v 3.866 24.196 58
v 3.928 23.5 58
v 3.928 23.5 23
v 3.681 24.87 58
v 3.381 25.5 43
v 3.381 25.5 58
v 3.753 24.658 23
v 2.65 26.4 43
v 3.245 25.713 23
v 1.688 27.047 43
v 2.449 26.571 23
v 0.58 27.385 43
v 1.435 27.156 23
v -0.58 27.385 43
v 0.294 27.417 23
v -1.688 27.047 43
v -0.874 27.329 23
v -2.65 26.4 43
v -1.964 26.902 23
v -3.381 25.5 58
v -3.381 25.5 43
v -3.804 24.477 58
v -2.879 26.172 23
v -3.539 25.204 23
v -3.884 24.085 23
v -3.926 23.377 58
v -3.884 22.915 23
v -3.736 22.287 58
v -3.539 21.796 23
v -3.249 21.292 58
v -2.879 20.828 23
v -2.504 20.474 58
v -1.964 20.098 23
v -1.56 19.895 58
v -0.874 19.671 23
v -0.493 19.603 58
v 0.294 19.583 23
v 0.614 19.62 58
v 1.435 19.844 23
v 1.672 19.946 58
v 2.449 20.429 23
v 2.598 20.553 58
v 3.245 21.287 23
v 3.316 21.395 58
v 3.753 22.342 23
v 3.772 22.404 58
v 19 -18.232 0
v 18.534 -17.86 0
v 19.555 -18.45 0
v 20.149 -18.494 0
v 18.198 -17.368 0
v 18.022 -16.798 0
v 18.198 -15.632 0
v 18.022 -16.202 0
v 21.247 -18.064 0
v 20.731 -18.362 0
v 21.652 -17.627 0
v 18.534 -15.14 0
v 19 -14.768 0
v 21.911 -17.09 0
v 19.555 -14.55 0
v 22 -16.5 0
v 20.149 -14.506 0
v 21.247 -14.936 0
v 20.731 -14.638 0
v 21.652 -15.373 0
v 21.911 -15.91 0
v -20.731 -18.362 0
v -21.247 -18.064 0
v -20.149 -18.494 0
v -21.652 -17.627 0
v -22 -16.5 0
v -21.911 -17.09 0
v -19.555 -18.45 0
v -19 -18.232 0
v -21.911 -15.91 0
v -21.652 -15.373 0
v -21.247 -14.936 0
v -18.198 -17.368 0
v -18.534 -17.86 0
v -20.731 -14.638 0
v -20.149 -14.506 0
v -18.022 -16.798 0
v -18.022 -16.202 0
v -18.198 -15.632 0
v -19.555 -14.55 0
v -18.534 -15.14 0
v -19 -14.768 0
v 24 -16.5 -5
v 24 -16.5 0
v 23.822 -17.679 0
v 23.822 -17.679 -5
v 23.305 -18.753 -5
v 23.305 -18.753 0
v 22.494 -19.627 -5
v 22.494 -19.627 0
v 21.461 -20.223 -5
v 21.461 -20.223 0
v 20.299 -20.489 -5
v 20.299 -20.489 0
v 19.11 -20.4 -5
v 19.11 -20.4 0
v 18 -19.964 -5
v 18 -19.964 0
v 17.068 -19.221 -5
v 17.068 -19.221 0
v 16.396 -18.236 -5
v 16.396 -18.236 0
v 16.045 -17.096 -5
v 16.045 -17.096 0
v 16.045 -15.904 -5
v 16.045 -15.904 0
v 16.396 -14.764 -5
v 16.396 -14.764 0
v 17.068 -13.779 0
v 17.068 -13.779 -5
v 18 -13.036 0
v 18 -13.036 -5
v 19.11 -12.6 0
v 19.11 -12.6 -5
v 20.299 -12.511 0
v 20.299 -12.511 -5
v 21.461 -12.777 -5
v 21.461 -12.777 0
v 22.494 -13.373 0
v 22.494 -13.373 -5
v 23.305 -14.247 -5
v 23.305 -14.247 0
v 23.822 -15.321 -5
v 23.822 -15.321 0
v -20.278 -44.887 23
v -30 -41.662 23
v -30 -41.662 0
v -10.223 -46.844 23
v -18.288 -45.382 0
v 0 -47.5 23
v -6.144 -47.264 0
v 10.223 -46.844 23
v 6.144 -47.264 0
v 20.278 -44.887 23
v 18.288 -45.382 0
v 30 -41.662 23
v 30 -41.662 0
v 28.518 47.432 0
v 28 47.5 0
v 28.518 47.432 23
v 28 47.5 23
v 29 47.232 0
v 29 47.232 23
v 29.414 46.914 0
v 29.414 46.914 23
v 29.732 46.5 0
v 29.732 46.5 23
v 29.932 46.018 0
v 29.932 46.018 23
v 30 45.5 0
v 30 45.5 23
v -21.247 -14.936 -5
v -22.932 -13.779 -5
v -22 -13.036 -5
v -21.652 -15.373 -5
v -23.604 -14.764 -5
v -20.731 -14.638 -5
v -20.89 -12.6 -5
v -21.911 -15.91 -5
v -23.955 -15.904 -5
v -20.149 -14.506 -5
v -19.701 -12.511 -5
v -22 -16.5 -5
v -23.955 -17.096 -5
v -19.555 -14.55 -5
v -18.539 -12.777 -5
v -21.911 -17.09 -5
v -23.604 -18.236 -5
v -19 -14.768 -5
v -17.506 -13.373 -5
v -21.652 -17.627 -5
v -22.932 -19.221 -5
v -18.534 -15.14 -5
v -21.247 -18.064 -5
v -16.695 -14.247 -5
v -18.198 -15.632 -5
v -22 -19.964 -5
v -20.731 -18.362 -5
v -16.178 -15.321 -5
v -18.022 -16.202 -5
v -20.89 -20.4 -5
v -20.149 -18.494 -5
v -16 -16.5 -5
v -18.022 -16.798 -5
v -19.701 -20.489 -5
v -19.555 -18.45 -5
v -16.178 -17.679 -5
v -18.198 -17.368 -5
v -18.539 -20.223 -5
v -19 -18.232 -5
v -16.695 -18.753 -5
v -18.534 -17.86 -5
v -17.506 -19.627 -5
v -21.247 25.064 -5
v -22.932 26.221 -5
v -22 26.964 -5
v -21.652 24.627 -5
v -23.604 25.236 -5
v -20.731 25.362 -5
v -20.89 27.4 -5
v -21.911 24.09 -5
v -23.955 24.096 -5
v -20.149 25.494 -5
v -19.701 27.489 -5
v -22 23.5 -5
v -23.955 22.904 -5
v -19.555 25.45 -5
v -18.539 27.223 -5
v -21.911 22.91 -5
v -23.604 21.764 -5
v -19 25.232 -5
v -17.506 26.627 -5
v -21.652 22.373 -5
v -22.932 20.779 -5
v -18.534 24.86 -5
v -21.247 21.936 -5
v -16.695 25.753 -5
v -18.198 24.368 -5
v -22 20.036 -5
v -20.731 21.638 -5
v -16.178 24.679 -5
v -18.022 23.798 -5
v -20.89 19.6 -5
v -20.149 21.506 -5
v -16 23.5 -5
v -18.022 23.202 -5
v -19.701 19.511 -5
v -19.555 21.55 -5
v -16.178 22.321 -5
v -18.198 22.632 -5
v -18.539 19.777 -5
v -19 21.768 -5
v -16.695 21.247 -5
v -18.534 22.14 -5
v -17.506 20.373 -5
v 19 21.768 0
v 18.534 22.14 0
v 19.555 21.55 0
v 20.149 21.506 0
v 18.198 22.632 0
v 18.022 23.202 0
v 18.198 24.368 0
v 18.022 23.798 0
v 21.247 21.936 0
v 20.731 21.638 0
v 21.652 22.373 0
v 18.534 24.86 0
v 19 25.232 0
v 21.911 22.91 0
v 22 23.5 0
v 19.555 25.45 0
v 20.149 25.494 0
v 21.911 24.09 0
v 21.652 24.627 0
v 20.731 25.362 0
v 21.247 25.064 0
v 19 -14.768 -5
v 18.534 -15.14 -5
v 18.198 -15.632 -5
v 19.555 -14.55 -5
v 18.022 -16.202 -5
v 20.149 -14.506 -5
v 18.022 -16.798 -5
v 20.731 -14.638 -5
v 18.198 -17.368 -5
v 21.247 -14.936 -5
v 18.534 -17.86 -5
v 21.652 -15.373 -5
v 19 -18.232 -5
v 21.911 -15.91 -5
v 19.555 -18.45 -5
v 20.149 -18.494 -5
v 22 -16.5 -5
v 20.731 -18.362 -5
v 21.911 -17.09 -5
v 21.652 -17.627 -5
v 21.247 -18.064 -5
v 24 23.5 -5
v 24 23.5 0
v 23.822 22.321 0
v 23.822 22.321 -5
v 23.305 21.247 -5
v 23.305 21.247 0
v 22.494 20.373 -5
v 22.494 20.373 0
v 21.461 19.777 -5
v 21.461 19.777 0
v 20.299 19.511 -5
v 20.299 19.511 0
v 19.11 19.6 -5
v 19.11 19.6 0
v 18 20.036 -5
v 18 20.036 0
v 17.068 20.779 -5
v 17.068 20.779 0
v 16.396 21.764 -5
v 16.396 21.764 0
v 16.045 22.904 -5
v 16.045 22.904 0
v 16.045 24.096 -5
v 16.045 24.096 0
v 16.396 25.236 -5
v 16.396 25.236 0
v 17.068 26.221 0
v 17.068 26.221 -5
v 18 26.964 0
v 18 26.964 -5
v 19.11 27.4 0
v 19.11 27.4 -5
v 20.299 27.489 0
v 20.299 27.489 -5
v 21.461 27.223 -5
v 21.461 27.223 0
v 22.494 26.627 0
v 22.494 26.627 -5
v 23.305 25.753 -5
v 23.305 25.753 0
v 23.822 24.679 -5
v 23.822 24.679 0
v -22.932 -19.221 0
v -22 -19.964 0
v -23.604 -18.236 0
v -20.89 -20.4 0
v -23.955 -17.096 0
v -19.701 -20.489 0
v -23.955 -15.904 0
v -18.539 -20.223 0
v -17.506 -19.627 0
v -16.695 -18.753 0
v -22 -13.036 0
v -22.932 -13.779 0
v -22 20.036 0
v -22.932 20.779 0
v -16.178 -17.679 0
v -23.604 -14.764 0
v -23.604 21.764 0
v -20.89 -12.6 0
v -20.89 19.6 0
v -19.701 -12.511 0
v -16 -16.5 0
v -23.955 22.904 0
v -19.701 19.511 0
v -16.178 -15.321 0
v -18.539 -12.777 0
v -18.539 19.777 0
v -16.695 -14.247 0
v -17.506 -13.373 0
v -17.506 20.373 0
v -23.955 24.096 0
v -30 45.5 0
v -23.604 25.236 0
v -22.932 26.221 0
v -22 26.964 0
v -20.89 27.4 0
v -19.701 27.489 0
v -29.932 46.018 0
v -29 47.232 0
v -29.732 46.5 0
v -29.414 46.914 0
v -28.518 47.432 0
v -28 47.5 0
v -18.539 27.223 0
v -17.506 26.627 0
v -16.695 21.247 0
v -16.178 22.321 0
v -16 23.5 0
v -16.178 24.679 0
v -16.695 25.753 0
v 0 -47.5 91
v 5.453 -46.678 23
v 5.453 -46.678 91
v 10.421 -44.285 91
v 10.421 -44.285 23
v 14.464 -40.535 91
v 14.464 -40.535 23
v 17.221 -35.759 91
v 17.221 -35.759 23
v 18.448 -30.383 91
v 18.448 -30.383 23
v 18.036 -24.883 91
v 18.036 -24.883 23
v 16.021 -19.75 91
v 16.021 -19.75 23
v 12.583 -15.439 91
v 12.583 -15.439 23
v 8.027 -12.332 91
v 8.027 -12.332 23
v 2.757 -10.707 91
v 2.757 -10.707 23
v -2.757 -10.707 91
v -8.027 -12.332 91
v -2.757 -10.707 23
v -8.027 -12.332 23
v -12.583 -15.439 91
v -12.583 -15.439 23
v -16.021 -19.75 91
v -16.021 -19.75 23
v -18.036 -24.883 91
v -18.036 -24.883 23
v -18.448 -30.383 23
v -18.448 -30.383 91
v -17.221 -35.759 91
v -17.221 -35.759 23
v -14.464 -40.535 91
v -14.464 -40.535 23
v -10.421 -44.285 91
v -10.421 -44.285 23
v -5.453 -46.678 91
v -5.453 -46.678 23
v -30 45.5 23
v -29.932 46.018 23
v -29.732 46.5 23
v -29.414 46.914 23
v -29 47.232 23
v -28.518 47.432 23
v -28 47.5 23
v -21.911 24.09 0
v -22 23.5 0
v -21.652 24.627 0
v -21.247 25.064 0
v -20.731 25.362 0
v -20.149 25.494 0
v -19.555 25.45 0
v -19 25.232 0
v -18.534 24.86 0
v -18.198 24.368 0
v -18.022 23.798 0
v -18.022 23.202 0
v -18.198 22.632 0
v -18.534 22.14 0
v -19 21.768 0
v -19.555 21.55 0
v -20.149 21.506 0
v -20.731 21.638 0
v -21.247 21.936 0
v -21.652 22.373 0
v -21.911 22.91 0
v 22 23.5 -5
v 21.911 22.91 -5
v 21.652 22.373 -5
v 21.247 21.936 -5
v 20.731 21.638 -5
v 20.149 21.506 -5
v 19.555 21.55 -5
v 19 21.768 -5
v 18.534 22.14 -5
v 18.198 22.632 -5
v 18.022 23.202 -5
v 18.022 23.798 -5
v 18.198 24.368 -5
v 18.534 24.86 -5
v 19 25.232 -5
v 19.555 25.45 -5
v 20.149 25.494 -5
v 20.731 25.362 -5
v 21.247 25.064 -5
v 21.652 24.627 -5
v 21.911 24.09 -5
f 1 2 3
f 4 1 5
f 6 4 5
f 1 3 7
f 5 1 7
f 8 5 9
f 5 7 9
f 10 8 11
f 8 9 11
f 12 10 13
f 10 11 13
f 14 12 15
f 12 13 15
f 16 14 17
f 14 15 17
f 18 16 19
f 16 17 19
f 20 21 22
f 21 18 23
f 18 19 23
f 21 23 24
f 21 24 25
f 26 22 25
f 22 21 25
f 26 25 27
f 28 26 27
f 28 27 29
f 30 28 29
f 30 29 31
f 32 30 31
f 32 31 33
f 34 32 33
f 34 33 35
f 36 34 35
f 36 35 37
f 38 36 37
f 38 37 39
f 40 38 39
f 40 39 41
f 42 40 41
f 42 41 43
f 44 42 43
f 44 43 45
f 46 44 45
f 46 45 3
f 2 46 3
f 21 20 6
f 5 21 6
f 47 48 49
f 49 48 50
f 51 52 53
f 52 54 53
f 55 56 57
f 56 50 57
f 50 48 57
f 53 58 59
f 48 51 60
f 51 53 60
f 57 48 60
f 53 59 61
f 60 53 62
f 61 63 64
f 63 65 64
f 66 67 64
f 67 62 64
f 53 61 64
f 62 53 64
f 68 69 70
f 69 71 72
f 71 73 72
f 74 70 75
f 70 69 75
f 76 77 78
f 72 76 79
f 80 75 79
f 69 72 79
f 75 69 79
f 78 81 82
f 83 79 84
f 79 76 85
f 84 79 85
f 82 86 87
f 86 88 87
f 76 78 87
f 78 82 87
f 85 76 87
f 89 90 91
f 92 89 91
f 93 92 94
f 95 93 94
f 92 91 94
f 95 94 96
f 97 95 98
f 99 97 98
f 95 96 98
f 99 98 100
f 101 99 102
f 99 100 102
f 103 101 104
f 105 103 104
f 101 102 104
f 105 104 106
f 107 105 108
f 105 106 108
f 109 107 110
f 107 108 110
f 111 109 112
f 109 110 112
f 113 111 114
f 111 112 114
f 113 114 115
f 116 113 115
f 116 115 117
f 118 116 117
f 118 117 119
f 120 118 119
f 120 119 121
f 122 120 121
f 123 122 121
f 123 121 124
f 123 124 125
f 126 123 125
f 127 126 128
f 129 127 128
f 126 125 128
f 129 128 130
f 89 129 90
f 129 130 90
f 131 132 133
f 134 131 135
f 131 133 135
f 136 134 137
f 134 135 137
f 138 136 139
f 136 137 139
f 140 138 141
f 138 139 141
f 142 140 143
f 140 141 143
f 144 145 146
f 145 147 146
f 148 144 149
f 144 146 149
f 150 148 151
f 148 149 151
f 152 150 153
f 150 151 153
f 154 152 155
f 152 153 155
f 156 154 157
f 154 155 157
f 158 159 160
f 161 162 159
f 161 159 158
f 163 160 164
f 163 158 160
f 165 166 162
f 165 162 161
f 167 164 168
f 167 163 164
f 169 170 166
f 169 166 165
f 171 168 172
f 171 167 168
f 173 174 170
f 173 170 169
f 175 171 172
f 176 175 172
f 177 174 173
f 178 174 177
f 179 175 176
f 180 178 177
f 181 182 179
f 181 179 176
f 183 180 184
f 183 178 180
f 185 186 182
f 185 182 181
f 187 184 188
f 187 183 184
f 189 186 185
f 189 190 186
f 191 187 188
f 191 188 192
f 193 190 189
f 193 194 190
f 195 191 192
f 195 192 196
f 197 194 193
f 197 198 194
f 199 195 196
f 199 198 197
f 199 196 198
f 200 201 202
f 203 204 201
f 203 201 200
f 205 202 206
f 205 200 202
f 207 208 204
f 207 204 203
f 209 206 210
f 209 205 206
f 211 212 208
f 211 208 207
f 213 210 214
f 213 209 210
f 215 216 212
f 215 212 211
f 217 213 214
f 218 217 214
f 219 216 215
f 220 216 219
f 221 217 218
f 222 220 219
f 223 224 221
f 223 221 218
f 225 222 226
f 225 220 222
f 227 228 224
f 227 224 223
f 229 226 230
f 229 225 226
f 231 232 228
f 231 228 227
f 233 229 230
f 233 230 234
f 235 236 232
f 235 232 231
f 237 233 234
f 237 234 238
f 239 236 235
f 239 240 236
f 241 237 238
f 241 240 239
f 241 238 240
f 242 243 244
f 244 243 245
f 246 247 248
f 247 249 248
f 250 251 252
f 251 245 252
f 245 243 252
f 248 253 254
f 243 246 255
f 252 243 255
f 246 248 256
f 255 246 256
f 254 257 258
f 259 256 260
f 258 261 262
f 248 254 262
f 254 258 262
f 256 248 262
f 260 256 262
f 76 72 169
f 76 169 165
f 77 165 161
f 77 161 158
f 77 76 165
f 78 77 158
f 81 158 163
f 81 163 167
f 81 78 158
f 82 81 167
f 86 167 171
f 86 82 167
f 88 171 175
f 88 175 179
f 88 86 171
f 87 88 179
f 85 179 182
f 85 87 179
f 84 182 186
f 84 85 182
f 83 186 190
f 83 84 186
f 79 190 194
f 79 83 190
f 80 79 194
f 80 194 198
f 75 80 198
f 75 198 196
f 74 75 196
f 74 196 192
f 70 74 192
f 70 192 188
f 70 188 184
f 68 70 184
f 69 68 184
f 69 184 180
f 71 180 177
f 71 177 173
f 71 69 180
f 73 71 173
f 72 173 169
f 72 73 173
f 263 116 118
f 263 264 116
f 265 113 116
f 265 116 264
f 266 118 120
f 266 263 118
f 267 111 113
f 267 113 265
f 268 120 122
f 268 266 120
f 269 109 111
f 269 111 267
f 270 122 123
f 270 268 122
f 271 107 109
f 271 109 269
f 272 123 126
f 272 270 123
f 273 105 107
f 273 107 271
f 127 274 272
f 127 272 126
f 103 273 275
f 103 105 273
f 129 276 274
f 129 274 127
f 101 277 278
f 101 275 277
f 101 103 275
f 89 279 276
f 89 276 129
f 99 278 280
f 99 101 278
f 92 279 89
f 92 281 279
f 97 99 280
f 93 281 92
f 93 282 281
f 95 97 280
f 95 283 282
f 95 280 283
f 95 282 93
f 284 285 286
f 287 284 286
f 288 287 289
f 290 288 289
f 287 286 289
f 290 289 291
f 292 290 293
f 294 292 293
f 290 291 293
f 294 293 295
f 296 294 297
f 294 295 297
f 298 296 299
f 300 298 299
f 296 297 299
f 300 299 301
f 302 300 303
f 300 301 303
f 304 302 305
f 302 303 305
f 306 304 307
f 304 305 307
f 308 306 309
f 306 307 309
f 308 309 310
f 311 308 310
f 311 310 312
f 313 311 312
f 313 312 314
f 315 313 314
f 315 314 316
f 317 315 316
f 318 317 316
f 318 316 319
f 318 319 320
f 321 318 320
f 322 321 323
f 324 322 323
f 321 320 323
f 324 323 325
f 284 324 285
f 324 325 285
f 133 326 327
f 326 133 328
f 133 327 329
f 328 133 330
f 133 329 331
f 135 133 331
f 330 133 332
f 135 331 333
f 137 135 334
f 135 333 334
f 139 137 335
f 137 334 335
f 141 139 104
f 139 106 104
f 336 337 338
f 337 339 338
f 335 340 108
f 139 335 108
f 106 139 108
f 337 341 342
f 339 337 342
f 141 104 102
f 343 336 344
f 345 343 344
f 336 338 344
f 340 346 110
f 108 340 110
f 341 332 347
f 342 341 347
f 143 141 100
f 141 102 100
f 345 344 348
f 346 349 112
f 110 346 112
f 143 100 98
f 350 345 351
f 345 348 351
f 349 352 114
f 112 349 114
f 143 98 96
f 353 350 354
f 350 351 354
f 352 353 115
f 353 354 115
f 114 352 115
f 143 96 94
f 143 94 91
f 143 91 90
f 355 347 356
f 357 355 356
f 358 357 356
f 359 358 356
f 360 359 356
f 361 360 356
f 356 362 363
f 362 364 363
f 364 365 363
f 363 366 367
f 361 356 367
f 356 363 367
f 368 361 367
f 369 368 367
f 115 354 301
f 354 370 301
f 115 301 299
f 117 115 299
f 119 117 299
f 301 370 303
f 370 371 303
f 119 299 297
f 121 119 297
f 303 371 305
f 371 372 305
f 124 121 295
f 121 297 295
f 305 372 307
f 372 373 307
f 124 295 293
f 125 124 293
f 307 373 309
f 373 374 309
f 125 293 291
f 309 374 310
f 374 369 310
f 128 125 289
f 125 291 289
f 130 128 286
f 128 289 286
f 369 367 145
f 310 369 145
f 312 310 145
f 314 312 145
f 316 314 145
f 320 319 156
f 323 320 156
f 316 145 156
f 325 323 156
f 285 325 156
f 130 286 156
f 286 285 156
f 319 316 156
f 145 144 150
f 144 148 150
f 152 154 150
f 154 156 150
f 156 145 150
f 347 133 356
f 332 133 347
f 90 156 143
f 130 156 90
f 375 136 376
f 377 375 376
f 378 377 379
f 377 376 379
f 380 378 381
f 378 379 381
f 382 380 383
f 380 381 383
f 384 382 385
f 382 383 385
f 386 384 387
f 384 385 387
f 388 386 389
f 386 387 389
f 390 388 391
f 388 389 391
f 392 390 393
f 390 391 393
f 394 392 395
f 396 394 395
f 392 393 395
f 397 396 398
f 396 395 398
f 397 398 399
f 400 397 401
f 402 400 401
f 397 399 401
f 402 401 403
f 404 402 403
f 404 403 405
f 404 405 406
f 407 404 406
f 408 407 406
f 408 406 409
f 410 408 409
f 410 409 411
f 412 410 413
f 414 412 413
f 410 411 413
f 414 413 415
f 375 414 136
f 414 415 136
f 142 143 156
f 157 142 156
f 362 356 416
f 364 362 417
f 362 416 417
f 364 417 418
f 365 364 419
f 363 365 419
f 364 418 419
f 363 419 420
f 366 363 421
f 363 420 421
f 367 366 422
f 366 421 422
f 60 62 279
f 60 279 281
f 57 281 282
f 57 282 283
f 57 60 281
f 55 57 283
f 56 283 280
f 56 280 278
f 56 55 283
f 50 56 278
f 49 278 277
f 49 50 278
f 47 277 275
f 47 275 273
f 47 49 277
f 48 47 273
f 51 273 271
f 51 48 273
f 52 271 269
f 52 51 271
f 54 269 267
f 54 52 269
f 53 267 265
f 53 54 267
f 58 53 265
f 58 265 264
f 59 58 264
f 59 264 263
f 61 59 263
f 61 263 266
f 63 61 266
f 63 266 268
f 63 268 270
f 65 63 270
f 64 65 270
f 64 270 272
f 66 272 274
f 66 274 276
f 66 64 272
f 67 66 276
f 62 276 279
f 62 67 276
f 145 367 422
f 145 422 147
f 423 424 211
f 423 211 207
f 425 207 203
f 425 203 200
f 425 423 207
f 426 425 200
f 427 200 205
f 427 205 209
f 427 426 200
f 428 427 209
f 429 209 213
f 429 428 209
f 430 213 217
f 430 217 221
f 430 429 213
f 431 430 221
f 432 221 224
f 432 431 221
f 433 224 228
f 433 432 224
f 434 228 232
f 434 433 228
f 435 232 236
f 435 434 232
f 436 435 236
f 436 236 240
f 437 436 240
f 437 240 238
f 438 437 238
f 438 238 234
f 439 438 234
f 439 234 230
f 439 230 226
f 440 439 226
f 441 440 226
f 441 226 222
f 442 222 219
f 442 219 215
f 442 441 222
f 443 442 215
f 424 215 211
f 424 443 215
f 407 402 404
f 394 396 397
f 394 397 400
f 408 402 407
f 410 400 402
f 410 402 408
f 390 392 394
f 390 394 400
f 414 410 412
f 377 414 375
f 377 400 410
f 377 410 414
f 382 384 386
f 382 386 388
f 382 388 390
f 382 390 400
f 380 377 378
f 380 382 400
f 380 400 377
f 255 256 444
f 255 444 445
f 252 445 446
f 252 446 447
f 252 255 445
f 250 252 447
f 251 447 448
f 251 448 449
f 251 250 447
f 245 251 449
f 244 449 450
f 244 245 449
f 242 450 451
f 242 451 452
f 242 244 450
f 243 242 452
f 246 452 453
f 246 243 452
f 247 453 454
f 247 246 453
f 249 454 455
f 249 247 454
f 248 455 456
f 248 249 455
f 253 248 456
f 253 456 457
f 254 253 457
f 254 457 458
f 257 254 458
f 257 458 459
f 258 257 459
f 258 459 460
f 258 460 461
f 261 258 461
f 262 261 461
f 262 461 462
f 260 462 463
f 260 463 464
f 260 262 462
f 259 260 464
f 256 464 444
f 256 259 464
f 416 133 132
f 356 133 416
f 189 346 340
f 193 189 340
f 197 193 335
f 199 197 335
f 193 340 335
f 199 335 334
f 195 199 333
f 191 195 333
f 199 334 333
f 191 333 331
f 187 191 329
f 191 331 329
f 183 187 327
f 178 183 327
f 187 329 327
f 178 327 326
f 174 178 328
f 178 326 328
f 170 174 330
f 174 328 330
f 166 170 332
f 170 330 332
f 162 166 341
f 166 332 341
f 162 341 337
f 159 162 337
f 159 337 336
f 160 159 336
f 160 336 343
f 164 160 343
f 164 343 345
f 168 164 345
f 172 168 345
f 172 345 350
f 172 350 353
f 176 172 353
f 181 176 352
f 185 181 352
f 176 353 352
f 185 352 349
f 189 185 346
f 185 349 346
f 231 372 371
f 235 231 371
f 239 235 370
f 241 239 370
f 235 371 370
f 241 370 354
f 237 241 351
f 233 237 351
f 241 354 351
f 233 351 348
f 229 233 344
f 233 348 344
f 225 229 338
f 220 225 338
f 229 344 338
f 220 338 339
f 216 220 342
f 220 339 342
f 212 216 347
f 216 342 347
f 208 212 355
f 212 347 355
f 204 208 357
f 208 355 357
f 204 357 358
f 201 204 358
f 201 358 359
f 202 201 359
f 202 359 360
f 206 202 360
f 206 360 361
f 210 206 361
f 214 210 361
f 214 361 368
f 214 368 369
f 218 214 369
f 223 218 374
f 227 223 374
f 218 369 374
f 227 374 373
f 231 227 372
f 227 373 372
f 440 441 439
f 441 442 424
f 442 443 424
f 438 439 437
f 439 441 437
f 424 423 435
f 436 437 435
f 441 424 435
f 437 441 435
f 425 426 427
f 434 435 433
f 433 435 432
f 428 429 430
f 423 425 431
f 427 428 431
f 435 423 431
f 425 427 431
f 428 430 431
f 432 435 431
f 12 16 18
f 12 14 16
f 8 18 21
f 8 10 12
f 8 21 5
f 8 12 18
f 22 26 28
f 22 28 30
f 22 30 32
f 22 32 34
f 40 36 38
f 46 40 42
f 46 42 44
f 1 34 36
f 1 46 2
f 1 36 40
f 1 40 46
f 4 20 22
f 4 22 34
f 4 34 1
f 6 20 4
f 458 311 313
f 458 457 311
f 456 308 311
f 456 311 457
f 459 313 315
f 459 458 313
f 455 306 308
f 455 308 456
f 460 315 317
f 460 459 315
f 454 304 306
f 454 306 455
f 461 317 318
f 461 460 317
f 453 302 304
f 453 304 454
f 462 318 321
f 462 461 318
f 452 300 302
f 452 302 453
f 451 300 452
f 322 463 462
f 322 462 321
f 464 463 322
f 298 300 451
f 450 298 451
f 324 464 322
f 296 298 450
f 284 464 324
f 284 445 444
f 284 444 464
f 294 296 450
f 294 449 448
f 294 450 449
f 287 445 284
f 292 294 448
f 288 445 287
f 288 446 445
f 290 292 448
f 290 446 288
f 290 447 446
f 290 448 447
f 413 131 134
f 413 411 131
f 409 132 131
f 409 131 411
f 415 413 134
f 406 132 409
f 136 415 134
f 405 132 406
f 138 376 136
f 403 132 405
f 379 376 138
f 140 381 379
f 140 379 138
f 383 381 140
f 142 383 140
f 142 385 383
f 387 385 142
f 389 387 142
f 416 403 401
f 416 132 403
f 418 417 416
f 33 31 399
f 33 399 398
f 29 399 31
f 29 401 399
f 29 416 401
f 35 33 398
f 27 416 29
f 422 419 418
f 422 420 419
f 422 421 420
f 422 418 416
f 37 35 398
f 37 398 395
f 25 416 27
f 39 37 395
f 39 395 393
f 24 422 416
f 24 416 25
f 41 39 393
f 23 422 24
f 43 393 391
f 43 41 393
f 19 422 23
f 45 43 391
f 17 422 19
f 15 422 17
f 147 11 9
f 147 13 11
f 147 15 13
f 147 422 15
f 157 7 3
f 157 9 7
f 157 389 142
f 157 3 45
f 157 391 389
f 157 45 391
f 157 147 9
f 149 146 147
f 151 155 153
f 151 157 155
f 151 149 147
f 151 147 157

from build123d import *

# Parameters (mm, degrees)
SKETCH_3_W          = 60
SKETCH_3_H          = 95
EXTRUDE_1_DEPTH     = 23
SKETCH_4_R          = 18.5
EXTRUDE_2_DEPTH     = 68
SKETCH_5_R          = 3.927968391
EXTRUDE_3_DEPTH     = 35
CUT_EXTRUDE_4_DEPTH = 15
SKETCH_7_R          = 4
SKETCH_7_R_2        = 2
EXTRUDE_5_DEPTH     = 5
FILLET_1_R          = 2
FILLET_2_R          = 2
CUT_EXTRUDE_5_DEPTH = 18
CUT_EXTRUDE_6_DEPTH = 50


with BuildPart() as part:
    # 草图3 → 凸台-拉伸1 (new body)
    with BuildSketch(Plane.XY):
        Rectangle(SKETCH_3_W, SKETCH_3_H)
    extrude(amount=EXTRUDE_1_DEPTH)

    # 草图4 → 凸台-拉伸2 (add)
    with BuildSketch(Plane.XY.offset(23)):
        with Locations((0, -29)):
            Circle(SKETCH_4_R)
    extrude(amount=EXTRUDE_2_DEPTH)

    # 草图5 → 凸台-拉伸3 (add)
    with BuildSketch(Plane.XY.offset(23)):
        with Locations((0, 23.5)):
            Circle(SKETCH_5_R)
    extrude(amount=EXTRUDE_3_DEPTH)

    # 草图6 → 切除-拉伸4 (cut)
    with BuildSketch(Plane.XY.offset(58)):
        Polygon((-3.927968391, 25.5), (3.927968391, 25.5), (-0.421673312, 30.850225799), align=None)
    extrude(amount=-CUT_EXTRUDE_4_DEPTH, mode=Mode.SUBTRACT)

    # 草图7 → 凸台-拉伸5 (add)
    # profile 1 of 4: a face of its own
    with BuildSketch(Plane(origin=(0, 0, 0), x_dir=(-1, 0, 0), z_dir=(0, 0, -1))):
        with Locations((20, 23.5)):
            Circle(SKETCH_7_R)
        with Locations((20, 23.5)):
            Circle(SKETCH_7_R_2, mode=Mode.SUBTRACT)
    # profile 2 of 4: a face of its own
    with BuildSketch(Plane(origin=(0, 0, 0), x_dir=(-1, 0, 0), z_dir=(0, 0, -1))):
        with Locations((-20, 23.5)):
            Circle(SKETCH_7_R)
        with Locations((-20, 23.5)):
            Circle(SKETCH_7_R_2, mode=Mode.SUBTRACT)
    # profile 3 of 4: a face of its own
    with BuildSketch(Plane(origin=(0, 0, 0), x_dir=(-1, 0, 0), z_dir=(0, 0, -1))):
        with Locations((20, -16.5)):
            Circle(SKETCH_7_R)
        with Locations((20, -16.5)):
            Circle(SKETCH_7_R_2, mode=Mode.SUBTRACT)
    # profile 4 of 4: a face of its own
    with BuildSketch(Plane(origin=(0, 0, 0), x_dir=(-1, 0, 0), z_dir=(0, 0, -1))):
        with Locations((-20, -16.5)):
            Circle(SKETCH_7_R)
        with Locations((-20, -16.5)):
            Circle(SKETCH_7_R_2, mode=Mode.SUBTRACT)
    extrude(amount=EXTRUDE_5_DEPTH)

    # 圆角1
    fillet_1_edges = [part.edges().sort_by_distance(p)[0] for p in [
        (-30, 47.5, 11.5),
    ]]
    fillet(fillet_1_edges, radius=FILLET_1_R)

    # 圆角2
    fillet_2_edges = [part.edges().sort_by_distance(p)[0] for p in [
        (30, 47.5, 11.5),
    ]]
    fillet(fillet_2_edges, radius=FILLET_2_R)

    # 草图8 → 切除-拉伸5 (cut)
    with BuildSketch(Plane(origin=(0, 0, 0), x_dir=(-1, 0, 0), z_dir=(0, 0, -1))):
        with BuildLine():
            Line((-58.103479581, -22.49077796), (-70.696713814, -61.415320137))
            Line((-70.696713814, -61.415320137), (7.471875411, -106.902176459))
            Line((7.471875411, -106.902176459), (82.773645961, -42.112074387))
            Line((82.773645961, -42.112074387), (69.369579427, -7.347979247))
            ThreePointArc((69.369579427, -7.347979247), (9.437019638, -46.941441706), (-58.103479581, -22.49077796))
        make_face()
    extrude(amount=-CUT_EXTRUDE_5_DEPTH, mode=Mode.SUBTRACT)

    # 草图8<2> → 切除-拉伸6 (cut)
    with BuildSketch(Plane(origin=(0, 0, 0), x_dir=(-1, 0, 0), z_dir=(0, 0, -1))):
        with BuildLine():
            Line((-58.103479581, -22.49077796), (-70.696713814, -61.415320137))
            Line((-70.696713814, -61.415320137), (7.471875411, -106.902176459))
            Line((7.471875411, -106.902176459), (82.773645961, -42.112074387))
            Line((82.773645961, -42.112074387), (69.369579427, -7.347979247))
            ThreePointArc((69.369579427, -7.347979247), (9.437019638, -46.941441706), (-58.103479581, -22.49077796))
        make_face()
    extrude(amount=-CUT_EXTRUDE_6_DEPTH, mode=Mode.SUBTRACT)


solid = part.part
